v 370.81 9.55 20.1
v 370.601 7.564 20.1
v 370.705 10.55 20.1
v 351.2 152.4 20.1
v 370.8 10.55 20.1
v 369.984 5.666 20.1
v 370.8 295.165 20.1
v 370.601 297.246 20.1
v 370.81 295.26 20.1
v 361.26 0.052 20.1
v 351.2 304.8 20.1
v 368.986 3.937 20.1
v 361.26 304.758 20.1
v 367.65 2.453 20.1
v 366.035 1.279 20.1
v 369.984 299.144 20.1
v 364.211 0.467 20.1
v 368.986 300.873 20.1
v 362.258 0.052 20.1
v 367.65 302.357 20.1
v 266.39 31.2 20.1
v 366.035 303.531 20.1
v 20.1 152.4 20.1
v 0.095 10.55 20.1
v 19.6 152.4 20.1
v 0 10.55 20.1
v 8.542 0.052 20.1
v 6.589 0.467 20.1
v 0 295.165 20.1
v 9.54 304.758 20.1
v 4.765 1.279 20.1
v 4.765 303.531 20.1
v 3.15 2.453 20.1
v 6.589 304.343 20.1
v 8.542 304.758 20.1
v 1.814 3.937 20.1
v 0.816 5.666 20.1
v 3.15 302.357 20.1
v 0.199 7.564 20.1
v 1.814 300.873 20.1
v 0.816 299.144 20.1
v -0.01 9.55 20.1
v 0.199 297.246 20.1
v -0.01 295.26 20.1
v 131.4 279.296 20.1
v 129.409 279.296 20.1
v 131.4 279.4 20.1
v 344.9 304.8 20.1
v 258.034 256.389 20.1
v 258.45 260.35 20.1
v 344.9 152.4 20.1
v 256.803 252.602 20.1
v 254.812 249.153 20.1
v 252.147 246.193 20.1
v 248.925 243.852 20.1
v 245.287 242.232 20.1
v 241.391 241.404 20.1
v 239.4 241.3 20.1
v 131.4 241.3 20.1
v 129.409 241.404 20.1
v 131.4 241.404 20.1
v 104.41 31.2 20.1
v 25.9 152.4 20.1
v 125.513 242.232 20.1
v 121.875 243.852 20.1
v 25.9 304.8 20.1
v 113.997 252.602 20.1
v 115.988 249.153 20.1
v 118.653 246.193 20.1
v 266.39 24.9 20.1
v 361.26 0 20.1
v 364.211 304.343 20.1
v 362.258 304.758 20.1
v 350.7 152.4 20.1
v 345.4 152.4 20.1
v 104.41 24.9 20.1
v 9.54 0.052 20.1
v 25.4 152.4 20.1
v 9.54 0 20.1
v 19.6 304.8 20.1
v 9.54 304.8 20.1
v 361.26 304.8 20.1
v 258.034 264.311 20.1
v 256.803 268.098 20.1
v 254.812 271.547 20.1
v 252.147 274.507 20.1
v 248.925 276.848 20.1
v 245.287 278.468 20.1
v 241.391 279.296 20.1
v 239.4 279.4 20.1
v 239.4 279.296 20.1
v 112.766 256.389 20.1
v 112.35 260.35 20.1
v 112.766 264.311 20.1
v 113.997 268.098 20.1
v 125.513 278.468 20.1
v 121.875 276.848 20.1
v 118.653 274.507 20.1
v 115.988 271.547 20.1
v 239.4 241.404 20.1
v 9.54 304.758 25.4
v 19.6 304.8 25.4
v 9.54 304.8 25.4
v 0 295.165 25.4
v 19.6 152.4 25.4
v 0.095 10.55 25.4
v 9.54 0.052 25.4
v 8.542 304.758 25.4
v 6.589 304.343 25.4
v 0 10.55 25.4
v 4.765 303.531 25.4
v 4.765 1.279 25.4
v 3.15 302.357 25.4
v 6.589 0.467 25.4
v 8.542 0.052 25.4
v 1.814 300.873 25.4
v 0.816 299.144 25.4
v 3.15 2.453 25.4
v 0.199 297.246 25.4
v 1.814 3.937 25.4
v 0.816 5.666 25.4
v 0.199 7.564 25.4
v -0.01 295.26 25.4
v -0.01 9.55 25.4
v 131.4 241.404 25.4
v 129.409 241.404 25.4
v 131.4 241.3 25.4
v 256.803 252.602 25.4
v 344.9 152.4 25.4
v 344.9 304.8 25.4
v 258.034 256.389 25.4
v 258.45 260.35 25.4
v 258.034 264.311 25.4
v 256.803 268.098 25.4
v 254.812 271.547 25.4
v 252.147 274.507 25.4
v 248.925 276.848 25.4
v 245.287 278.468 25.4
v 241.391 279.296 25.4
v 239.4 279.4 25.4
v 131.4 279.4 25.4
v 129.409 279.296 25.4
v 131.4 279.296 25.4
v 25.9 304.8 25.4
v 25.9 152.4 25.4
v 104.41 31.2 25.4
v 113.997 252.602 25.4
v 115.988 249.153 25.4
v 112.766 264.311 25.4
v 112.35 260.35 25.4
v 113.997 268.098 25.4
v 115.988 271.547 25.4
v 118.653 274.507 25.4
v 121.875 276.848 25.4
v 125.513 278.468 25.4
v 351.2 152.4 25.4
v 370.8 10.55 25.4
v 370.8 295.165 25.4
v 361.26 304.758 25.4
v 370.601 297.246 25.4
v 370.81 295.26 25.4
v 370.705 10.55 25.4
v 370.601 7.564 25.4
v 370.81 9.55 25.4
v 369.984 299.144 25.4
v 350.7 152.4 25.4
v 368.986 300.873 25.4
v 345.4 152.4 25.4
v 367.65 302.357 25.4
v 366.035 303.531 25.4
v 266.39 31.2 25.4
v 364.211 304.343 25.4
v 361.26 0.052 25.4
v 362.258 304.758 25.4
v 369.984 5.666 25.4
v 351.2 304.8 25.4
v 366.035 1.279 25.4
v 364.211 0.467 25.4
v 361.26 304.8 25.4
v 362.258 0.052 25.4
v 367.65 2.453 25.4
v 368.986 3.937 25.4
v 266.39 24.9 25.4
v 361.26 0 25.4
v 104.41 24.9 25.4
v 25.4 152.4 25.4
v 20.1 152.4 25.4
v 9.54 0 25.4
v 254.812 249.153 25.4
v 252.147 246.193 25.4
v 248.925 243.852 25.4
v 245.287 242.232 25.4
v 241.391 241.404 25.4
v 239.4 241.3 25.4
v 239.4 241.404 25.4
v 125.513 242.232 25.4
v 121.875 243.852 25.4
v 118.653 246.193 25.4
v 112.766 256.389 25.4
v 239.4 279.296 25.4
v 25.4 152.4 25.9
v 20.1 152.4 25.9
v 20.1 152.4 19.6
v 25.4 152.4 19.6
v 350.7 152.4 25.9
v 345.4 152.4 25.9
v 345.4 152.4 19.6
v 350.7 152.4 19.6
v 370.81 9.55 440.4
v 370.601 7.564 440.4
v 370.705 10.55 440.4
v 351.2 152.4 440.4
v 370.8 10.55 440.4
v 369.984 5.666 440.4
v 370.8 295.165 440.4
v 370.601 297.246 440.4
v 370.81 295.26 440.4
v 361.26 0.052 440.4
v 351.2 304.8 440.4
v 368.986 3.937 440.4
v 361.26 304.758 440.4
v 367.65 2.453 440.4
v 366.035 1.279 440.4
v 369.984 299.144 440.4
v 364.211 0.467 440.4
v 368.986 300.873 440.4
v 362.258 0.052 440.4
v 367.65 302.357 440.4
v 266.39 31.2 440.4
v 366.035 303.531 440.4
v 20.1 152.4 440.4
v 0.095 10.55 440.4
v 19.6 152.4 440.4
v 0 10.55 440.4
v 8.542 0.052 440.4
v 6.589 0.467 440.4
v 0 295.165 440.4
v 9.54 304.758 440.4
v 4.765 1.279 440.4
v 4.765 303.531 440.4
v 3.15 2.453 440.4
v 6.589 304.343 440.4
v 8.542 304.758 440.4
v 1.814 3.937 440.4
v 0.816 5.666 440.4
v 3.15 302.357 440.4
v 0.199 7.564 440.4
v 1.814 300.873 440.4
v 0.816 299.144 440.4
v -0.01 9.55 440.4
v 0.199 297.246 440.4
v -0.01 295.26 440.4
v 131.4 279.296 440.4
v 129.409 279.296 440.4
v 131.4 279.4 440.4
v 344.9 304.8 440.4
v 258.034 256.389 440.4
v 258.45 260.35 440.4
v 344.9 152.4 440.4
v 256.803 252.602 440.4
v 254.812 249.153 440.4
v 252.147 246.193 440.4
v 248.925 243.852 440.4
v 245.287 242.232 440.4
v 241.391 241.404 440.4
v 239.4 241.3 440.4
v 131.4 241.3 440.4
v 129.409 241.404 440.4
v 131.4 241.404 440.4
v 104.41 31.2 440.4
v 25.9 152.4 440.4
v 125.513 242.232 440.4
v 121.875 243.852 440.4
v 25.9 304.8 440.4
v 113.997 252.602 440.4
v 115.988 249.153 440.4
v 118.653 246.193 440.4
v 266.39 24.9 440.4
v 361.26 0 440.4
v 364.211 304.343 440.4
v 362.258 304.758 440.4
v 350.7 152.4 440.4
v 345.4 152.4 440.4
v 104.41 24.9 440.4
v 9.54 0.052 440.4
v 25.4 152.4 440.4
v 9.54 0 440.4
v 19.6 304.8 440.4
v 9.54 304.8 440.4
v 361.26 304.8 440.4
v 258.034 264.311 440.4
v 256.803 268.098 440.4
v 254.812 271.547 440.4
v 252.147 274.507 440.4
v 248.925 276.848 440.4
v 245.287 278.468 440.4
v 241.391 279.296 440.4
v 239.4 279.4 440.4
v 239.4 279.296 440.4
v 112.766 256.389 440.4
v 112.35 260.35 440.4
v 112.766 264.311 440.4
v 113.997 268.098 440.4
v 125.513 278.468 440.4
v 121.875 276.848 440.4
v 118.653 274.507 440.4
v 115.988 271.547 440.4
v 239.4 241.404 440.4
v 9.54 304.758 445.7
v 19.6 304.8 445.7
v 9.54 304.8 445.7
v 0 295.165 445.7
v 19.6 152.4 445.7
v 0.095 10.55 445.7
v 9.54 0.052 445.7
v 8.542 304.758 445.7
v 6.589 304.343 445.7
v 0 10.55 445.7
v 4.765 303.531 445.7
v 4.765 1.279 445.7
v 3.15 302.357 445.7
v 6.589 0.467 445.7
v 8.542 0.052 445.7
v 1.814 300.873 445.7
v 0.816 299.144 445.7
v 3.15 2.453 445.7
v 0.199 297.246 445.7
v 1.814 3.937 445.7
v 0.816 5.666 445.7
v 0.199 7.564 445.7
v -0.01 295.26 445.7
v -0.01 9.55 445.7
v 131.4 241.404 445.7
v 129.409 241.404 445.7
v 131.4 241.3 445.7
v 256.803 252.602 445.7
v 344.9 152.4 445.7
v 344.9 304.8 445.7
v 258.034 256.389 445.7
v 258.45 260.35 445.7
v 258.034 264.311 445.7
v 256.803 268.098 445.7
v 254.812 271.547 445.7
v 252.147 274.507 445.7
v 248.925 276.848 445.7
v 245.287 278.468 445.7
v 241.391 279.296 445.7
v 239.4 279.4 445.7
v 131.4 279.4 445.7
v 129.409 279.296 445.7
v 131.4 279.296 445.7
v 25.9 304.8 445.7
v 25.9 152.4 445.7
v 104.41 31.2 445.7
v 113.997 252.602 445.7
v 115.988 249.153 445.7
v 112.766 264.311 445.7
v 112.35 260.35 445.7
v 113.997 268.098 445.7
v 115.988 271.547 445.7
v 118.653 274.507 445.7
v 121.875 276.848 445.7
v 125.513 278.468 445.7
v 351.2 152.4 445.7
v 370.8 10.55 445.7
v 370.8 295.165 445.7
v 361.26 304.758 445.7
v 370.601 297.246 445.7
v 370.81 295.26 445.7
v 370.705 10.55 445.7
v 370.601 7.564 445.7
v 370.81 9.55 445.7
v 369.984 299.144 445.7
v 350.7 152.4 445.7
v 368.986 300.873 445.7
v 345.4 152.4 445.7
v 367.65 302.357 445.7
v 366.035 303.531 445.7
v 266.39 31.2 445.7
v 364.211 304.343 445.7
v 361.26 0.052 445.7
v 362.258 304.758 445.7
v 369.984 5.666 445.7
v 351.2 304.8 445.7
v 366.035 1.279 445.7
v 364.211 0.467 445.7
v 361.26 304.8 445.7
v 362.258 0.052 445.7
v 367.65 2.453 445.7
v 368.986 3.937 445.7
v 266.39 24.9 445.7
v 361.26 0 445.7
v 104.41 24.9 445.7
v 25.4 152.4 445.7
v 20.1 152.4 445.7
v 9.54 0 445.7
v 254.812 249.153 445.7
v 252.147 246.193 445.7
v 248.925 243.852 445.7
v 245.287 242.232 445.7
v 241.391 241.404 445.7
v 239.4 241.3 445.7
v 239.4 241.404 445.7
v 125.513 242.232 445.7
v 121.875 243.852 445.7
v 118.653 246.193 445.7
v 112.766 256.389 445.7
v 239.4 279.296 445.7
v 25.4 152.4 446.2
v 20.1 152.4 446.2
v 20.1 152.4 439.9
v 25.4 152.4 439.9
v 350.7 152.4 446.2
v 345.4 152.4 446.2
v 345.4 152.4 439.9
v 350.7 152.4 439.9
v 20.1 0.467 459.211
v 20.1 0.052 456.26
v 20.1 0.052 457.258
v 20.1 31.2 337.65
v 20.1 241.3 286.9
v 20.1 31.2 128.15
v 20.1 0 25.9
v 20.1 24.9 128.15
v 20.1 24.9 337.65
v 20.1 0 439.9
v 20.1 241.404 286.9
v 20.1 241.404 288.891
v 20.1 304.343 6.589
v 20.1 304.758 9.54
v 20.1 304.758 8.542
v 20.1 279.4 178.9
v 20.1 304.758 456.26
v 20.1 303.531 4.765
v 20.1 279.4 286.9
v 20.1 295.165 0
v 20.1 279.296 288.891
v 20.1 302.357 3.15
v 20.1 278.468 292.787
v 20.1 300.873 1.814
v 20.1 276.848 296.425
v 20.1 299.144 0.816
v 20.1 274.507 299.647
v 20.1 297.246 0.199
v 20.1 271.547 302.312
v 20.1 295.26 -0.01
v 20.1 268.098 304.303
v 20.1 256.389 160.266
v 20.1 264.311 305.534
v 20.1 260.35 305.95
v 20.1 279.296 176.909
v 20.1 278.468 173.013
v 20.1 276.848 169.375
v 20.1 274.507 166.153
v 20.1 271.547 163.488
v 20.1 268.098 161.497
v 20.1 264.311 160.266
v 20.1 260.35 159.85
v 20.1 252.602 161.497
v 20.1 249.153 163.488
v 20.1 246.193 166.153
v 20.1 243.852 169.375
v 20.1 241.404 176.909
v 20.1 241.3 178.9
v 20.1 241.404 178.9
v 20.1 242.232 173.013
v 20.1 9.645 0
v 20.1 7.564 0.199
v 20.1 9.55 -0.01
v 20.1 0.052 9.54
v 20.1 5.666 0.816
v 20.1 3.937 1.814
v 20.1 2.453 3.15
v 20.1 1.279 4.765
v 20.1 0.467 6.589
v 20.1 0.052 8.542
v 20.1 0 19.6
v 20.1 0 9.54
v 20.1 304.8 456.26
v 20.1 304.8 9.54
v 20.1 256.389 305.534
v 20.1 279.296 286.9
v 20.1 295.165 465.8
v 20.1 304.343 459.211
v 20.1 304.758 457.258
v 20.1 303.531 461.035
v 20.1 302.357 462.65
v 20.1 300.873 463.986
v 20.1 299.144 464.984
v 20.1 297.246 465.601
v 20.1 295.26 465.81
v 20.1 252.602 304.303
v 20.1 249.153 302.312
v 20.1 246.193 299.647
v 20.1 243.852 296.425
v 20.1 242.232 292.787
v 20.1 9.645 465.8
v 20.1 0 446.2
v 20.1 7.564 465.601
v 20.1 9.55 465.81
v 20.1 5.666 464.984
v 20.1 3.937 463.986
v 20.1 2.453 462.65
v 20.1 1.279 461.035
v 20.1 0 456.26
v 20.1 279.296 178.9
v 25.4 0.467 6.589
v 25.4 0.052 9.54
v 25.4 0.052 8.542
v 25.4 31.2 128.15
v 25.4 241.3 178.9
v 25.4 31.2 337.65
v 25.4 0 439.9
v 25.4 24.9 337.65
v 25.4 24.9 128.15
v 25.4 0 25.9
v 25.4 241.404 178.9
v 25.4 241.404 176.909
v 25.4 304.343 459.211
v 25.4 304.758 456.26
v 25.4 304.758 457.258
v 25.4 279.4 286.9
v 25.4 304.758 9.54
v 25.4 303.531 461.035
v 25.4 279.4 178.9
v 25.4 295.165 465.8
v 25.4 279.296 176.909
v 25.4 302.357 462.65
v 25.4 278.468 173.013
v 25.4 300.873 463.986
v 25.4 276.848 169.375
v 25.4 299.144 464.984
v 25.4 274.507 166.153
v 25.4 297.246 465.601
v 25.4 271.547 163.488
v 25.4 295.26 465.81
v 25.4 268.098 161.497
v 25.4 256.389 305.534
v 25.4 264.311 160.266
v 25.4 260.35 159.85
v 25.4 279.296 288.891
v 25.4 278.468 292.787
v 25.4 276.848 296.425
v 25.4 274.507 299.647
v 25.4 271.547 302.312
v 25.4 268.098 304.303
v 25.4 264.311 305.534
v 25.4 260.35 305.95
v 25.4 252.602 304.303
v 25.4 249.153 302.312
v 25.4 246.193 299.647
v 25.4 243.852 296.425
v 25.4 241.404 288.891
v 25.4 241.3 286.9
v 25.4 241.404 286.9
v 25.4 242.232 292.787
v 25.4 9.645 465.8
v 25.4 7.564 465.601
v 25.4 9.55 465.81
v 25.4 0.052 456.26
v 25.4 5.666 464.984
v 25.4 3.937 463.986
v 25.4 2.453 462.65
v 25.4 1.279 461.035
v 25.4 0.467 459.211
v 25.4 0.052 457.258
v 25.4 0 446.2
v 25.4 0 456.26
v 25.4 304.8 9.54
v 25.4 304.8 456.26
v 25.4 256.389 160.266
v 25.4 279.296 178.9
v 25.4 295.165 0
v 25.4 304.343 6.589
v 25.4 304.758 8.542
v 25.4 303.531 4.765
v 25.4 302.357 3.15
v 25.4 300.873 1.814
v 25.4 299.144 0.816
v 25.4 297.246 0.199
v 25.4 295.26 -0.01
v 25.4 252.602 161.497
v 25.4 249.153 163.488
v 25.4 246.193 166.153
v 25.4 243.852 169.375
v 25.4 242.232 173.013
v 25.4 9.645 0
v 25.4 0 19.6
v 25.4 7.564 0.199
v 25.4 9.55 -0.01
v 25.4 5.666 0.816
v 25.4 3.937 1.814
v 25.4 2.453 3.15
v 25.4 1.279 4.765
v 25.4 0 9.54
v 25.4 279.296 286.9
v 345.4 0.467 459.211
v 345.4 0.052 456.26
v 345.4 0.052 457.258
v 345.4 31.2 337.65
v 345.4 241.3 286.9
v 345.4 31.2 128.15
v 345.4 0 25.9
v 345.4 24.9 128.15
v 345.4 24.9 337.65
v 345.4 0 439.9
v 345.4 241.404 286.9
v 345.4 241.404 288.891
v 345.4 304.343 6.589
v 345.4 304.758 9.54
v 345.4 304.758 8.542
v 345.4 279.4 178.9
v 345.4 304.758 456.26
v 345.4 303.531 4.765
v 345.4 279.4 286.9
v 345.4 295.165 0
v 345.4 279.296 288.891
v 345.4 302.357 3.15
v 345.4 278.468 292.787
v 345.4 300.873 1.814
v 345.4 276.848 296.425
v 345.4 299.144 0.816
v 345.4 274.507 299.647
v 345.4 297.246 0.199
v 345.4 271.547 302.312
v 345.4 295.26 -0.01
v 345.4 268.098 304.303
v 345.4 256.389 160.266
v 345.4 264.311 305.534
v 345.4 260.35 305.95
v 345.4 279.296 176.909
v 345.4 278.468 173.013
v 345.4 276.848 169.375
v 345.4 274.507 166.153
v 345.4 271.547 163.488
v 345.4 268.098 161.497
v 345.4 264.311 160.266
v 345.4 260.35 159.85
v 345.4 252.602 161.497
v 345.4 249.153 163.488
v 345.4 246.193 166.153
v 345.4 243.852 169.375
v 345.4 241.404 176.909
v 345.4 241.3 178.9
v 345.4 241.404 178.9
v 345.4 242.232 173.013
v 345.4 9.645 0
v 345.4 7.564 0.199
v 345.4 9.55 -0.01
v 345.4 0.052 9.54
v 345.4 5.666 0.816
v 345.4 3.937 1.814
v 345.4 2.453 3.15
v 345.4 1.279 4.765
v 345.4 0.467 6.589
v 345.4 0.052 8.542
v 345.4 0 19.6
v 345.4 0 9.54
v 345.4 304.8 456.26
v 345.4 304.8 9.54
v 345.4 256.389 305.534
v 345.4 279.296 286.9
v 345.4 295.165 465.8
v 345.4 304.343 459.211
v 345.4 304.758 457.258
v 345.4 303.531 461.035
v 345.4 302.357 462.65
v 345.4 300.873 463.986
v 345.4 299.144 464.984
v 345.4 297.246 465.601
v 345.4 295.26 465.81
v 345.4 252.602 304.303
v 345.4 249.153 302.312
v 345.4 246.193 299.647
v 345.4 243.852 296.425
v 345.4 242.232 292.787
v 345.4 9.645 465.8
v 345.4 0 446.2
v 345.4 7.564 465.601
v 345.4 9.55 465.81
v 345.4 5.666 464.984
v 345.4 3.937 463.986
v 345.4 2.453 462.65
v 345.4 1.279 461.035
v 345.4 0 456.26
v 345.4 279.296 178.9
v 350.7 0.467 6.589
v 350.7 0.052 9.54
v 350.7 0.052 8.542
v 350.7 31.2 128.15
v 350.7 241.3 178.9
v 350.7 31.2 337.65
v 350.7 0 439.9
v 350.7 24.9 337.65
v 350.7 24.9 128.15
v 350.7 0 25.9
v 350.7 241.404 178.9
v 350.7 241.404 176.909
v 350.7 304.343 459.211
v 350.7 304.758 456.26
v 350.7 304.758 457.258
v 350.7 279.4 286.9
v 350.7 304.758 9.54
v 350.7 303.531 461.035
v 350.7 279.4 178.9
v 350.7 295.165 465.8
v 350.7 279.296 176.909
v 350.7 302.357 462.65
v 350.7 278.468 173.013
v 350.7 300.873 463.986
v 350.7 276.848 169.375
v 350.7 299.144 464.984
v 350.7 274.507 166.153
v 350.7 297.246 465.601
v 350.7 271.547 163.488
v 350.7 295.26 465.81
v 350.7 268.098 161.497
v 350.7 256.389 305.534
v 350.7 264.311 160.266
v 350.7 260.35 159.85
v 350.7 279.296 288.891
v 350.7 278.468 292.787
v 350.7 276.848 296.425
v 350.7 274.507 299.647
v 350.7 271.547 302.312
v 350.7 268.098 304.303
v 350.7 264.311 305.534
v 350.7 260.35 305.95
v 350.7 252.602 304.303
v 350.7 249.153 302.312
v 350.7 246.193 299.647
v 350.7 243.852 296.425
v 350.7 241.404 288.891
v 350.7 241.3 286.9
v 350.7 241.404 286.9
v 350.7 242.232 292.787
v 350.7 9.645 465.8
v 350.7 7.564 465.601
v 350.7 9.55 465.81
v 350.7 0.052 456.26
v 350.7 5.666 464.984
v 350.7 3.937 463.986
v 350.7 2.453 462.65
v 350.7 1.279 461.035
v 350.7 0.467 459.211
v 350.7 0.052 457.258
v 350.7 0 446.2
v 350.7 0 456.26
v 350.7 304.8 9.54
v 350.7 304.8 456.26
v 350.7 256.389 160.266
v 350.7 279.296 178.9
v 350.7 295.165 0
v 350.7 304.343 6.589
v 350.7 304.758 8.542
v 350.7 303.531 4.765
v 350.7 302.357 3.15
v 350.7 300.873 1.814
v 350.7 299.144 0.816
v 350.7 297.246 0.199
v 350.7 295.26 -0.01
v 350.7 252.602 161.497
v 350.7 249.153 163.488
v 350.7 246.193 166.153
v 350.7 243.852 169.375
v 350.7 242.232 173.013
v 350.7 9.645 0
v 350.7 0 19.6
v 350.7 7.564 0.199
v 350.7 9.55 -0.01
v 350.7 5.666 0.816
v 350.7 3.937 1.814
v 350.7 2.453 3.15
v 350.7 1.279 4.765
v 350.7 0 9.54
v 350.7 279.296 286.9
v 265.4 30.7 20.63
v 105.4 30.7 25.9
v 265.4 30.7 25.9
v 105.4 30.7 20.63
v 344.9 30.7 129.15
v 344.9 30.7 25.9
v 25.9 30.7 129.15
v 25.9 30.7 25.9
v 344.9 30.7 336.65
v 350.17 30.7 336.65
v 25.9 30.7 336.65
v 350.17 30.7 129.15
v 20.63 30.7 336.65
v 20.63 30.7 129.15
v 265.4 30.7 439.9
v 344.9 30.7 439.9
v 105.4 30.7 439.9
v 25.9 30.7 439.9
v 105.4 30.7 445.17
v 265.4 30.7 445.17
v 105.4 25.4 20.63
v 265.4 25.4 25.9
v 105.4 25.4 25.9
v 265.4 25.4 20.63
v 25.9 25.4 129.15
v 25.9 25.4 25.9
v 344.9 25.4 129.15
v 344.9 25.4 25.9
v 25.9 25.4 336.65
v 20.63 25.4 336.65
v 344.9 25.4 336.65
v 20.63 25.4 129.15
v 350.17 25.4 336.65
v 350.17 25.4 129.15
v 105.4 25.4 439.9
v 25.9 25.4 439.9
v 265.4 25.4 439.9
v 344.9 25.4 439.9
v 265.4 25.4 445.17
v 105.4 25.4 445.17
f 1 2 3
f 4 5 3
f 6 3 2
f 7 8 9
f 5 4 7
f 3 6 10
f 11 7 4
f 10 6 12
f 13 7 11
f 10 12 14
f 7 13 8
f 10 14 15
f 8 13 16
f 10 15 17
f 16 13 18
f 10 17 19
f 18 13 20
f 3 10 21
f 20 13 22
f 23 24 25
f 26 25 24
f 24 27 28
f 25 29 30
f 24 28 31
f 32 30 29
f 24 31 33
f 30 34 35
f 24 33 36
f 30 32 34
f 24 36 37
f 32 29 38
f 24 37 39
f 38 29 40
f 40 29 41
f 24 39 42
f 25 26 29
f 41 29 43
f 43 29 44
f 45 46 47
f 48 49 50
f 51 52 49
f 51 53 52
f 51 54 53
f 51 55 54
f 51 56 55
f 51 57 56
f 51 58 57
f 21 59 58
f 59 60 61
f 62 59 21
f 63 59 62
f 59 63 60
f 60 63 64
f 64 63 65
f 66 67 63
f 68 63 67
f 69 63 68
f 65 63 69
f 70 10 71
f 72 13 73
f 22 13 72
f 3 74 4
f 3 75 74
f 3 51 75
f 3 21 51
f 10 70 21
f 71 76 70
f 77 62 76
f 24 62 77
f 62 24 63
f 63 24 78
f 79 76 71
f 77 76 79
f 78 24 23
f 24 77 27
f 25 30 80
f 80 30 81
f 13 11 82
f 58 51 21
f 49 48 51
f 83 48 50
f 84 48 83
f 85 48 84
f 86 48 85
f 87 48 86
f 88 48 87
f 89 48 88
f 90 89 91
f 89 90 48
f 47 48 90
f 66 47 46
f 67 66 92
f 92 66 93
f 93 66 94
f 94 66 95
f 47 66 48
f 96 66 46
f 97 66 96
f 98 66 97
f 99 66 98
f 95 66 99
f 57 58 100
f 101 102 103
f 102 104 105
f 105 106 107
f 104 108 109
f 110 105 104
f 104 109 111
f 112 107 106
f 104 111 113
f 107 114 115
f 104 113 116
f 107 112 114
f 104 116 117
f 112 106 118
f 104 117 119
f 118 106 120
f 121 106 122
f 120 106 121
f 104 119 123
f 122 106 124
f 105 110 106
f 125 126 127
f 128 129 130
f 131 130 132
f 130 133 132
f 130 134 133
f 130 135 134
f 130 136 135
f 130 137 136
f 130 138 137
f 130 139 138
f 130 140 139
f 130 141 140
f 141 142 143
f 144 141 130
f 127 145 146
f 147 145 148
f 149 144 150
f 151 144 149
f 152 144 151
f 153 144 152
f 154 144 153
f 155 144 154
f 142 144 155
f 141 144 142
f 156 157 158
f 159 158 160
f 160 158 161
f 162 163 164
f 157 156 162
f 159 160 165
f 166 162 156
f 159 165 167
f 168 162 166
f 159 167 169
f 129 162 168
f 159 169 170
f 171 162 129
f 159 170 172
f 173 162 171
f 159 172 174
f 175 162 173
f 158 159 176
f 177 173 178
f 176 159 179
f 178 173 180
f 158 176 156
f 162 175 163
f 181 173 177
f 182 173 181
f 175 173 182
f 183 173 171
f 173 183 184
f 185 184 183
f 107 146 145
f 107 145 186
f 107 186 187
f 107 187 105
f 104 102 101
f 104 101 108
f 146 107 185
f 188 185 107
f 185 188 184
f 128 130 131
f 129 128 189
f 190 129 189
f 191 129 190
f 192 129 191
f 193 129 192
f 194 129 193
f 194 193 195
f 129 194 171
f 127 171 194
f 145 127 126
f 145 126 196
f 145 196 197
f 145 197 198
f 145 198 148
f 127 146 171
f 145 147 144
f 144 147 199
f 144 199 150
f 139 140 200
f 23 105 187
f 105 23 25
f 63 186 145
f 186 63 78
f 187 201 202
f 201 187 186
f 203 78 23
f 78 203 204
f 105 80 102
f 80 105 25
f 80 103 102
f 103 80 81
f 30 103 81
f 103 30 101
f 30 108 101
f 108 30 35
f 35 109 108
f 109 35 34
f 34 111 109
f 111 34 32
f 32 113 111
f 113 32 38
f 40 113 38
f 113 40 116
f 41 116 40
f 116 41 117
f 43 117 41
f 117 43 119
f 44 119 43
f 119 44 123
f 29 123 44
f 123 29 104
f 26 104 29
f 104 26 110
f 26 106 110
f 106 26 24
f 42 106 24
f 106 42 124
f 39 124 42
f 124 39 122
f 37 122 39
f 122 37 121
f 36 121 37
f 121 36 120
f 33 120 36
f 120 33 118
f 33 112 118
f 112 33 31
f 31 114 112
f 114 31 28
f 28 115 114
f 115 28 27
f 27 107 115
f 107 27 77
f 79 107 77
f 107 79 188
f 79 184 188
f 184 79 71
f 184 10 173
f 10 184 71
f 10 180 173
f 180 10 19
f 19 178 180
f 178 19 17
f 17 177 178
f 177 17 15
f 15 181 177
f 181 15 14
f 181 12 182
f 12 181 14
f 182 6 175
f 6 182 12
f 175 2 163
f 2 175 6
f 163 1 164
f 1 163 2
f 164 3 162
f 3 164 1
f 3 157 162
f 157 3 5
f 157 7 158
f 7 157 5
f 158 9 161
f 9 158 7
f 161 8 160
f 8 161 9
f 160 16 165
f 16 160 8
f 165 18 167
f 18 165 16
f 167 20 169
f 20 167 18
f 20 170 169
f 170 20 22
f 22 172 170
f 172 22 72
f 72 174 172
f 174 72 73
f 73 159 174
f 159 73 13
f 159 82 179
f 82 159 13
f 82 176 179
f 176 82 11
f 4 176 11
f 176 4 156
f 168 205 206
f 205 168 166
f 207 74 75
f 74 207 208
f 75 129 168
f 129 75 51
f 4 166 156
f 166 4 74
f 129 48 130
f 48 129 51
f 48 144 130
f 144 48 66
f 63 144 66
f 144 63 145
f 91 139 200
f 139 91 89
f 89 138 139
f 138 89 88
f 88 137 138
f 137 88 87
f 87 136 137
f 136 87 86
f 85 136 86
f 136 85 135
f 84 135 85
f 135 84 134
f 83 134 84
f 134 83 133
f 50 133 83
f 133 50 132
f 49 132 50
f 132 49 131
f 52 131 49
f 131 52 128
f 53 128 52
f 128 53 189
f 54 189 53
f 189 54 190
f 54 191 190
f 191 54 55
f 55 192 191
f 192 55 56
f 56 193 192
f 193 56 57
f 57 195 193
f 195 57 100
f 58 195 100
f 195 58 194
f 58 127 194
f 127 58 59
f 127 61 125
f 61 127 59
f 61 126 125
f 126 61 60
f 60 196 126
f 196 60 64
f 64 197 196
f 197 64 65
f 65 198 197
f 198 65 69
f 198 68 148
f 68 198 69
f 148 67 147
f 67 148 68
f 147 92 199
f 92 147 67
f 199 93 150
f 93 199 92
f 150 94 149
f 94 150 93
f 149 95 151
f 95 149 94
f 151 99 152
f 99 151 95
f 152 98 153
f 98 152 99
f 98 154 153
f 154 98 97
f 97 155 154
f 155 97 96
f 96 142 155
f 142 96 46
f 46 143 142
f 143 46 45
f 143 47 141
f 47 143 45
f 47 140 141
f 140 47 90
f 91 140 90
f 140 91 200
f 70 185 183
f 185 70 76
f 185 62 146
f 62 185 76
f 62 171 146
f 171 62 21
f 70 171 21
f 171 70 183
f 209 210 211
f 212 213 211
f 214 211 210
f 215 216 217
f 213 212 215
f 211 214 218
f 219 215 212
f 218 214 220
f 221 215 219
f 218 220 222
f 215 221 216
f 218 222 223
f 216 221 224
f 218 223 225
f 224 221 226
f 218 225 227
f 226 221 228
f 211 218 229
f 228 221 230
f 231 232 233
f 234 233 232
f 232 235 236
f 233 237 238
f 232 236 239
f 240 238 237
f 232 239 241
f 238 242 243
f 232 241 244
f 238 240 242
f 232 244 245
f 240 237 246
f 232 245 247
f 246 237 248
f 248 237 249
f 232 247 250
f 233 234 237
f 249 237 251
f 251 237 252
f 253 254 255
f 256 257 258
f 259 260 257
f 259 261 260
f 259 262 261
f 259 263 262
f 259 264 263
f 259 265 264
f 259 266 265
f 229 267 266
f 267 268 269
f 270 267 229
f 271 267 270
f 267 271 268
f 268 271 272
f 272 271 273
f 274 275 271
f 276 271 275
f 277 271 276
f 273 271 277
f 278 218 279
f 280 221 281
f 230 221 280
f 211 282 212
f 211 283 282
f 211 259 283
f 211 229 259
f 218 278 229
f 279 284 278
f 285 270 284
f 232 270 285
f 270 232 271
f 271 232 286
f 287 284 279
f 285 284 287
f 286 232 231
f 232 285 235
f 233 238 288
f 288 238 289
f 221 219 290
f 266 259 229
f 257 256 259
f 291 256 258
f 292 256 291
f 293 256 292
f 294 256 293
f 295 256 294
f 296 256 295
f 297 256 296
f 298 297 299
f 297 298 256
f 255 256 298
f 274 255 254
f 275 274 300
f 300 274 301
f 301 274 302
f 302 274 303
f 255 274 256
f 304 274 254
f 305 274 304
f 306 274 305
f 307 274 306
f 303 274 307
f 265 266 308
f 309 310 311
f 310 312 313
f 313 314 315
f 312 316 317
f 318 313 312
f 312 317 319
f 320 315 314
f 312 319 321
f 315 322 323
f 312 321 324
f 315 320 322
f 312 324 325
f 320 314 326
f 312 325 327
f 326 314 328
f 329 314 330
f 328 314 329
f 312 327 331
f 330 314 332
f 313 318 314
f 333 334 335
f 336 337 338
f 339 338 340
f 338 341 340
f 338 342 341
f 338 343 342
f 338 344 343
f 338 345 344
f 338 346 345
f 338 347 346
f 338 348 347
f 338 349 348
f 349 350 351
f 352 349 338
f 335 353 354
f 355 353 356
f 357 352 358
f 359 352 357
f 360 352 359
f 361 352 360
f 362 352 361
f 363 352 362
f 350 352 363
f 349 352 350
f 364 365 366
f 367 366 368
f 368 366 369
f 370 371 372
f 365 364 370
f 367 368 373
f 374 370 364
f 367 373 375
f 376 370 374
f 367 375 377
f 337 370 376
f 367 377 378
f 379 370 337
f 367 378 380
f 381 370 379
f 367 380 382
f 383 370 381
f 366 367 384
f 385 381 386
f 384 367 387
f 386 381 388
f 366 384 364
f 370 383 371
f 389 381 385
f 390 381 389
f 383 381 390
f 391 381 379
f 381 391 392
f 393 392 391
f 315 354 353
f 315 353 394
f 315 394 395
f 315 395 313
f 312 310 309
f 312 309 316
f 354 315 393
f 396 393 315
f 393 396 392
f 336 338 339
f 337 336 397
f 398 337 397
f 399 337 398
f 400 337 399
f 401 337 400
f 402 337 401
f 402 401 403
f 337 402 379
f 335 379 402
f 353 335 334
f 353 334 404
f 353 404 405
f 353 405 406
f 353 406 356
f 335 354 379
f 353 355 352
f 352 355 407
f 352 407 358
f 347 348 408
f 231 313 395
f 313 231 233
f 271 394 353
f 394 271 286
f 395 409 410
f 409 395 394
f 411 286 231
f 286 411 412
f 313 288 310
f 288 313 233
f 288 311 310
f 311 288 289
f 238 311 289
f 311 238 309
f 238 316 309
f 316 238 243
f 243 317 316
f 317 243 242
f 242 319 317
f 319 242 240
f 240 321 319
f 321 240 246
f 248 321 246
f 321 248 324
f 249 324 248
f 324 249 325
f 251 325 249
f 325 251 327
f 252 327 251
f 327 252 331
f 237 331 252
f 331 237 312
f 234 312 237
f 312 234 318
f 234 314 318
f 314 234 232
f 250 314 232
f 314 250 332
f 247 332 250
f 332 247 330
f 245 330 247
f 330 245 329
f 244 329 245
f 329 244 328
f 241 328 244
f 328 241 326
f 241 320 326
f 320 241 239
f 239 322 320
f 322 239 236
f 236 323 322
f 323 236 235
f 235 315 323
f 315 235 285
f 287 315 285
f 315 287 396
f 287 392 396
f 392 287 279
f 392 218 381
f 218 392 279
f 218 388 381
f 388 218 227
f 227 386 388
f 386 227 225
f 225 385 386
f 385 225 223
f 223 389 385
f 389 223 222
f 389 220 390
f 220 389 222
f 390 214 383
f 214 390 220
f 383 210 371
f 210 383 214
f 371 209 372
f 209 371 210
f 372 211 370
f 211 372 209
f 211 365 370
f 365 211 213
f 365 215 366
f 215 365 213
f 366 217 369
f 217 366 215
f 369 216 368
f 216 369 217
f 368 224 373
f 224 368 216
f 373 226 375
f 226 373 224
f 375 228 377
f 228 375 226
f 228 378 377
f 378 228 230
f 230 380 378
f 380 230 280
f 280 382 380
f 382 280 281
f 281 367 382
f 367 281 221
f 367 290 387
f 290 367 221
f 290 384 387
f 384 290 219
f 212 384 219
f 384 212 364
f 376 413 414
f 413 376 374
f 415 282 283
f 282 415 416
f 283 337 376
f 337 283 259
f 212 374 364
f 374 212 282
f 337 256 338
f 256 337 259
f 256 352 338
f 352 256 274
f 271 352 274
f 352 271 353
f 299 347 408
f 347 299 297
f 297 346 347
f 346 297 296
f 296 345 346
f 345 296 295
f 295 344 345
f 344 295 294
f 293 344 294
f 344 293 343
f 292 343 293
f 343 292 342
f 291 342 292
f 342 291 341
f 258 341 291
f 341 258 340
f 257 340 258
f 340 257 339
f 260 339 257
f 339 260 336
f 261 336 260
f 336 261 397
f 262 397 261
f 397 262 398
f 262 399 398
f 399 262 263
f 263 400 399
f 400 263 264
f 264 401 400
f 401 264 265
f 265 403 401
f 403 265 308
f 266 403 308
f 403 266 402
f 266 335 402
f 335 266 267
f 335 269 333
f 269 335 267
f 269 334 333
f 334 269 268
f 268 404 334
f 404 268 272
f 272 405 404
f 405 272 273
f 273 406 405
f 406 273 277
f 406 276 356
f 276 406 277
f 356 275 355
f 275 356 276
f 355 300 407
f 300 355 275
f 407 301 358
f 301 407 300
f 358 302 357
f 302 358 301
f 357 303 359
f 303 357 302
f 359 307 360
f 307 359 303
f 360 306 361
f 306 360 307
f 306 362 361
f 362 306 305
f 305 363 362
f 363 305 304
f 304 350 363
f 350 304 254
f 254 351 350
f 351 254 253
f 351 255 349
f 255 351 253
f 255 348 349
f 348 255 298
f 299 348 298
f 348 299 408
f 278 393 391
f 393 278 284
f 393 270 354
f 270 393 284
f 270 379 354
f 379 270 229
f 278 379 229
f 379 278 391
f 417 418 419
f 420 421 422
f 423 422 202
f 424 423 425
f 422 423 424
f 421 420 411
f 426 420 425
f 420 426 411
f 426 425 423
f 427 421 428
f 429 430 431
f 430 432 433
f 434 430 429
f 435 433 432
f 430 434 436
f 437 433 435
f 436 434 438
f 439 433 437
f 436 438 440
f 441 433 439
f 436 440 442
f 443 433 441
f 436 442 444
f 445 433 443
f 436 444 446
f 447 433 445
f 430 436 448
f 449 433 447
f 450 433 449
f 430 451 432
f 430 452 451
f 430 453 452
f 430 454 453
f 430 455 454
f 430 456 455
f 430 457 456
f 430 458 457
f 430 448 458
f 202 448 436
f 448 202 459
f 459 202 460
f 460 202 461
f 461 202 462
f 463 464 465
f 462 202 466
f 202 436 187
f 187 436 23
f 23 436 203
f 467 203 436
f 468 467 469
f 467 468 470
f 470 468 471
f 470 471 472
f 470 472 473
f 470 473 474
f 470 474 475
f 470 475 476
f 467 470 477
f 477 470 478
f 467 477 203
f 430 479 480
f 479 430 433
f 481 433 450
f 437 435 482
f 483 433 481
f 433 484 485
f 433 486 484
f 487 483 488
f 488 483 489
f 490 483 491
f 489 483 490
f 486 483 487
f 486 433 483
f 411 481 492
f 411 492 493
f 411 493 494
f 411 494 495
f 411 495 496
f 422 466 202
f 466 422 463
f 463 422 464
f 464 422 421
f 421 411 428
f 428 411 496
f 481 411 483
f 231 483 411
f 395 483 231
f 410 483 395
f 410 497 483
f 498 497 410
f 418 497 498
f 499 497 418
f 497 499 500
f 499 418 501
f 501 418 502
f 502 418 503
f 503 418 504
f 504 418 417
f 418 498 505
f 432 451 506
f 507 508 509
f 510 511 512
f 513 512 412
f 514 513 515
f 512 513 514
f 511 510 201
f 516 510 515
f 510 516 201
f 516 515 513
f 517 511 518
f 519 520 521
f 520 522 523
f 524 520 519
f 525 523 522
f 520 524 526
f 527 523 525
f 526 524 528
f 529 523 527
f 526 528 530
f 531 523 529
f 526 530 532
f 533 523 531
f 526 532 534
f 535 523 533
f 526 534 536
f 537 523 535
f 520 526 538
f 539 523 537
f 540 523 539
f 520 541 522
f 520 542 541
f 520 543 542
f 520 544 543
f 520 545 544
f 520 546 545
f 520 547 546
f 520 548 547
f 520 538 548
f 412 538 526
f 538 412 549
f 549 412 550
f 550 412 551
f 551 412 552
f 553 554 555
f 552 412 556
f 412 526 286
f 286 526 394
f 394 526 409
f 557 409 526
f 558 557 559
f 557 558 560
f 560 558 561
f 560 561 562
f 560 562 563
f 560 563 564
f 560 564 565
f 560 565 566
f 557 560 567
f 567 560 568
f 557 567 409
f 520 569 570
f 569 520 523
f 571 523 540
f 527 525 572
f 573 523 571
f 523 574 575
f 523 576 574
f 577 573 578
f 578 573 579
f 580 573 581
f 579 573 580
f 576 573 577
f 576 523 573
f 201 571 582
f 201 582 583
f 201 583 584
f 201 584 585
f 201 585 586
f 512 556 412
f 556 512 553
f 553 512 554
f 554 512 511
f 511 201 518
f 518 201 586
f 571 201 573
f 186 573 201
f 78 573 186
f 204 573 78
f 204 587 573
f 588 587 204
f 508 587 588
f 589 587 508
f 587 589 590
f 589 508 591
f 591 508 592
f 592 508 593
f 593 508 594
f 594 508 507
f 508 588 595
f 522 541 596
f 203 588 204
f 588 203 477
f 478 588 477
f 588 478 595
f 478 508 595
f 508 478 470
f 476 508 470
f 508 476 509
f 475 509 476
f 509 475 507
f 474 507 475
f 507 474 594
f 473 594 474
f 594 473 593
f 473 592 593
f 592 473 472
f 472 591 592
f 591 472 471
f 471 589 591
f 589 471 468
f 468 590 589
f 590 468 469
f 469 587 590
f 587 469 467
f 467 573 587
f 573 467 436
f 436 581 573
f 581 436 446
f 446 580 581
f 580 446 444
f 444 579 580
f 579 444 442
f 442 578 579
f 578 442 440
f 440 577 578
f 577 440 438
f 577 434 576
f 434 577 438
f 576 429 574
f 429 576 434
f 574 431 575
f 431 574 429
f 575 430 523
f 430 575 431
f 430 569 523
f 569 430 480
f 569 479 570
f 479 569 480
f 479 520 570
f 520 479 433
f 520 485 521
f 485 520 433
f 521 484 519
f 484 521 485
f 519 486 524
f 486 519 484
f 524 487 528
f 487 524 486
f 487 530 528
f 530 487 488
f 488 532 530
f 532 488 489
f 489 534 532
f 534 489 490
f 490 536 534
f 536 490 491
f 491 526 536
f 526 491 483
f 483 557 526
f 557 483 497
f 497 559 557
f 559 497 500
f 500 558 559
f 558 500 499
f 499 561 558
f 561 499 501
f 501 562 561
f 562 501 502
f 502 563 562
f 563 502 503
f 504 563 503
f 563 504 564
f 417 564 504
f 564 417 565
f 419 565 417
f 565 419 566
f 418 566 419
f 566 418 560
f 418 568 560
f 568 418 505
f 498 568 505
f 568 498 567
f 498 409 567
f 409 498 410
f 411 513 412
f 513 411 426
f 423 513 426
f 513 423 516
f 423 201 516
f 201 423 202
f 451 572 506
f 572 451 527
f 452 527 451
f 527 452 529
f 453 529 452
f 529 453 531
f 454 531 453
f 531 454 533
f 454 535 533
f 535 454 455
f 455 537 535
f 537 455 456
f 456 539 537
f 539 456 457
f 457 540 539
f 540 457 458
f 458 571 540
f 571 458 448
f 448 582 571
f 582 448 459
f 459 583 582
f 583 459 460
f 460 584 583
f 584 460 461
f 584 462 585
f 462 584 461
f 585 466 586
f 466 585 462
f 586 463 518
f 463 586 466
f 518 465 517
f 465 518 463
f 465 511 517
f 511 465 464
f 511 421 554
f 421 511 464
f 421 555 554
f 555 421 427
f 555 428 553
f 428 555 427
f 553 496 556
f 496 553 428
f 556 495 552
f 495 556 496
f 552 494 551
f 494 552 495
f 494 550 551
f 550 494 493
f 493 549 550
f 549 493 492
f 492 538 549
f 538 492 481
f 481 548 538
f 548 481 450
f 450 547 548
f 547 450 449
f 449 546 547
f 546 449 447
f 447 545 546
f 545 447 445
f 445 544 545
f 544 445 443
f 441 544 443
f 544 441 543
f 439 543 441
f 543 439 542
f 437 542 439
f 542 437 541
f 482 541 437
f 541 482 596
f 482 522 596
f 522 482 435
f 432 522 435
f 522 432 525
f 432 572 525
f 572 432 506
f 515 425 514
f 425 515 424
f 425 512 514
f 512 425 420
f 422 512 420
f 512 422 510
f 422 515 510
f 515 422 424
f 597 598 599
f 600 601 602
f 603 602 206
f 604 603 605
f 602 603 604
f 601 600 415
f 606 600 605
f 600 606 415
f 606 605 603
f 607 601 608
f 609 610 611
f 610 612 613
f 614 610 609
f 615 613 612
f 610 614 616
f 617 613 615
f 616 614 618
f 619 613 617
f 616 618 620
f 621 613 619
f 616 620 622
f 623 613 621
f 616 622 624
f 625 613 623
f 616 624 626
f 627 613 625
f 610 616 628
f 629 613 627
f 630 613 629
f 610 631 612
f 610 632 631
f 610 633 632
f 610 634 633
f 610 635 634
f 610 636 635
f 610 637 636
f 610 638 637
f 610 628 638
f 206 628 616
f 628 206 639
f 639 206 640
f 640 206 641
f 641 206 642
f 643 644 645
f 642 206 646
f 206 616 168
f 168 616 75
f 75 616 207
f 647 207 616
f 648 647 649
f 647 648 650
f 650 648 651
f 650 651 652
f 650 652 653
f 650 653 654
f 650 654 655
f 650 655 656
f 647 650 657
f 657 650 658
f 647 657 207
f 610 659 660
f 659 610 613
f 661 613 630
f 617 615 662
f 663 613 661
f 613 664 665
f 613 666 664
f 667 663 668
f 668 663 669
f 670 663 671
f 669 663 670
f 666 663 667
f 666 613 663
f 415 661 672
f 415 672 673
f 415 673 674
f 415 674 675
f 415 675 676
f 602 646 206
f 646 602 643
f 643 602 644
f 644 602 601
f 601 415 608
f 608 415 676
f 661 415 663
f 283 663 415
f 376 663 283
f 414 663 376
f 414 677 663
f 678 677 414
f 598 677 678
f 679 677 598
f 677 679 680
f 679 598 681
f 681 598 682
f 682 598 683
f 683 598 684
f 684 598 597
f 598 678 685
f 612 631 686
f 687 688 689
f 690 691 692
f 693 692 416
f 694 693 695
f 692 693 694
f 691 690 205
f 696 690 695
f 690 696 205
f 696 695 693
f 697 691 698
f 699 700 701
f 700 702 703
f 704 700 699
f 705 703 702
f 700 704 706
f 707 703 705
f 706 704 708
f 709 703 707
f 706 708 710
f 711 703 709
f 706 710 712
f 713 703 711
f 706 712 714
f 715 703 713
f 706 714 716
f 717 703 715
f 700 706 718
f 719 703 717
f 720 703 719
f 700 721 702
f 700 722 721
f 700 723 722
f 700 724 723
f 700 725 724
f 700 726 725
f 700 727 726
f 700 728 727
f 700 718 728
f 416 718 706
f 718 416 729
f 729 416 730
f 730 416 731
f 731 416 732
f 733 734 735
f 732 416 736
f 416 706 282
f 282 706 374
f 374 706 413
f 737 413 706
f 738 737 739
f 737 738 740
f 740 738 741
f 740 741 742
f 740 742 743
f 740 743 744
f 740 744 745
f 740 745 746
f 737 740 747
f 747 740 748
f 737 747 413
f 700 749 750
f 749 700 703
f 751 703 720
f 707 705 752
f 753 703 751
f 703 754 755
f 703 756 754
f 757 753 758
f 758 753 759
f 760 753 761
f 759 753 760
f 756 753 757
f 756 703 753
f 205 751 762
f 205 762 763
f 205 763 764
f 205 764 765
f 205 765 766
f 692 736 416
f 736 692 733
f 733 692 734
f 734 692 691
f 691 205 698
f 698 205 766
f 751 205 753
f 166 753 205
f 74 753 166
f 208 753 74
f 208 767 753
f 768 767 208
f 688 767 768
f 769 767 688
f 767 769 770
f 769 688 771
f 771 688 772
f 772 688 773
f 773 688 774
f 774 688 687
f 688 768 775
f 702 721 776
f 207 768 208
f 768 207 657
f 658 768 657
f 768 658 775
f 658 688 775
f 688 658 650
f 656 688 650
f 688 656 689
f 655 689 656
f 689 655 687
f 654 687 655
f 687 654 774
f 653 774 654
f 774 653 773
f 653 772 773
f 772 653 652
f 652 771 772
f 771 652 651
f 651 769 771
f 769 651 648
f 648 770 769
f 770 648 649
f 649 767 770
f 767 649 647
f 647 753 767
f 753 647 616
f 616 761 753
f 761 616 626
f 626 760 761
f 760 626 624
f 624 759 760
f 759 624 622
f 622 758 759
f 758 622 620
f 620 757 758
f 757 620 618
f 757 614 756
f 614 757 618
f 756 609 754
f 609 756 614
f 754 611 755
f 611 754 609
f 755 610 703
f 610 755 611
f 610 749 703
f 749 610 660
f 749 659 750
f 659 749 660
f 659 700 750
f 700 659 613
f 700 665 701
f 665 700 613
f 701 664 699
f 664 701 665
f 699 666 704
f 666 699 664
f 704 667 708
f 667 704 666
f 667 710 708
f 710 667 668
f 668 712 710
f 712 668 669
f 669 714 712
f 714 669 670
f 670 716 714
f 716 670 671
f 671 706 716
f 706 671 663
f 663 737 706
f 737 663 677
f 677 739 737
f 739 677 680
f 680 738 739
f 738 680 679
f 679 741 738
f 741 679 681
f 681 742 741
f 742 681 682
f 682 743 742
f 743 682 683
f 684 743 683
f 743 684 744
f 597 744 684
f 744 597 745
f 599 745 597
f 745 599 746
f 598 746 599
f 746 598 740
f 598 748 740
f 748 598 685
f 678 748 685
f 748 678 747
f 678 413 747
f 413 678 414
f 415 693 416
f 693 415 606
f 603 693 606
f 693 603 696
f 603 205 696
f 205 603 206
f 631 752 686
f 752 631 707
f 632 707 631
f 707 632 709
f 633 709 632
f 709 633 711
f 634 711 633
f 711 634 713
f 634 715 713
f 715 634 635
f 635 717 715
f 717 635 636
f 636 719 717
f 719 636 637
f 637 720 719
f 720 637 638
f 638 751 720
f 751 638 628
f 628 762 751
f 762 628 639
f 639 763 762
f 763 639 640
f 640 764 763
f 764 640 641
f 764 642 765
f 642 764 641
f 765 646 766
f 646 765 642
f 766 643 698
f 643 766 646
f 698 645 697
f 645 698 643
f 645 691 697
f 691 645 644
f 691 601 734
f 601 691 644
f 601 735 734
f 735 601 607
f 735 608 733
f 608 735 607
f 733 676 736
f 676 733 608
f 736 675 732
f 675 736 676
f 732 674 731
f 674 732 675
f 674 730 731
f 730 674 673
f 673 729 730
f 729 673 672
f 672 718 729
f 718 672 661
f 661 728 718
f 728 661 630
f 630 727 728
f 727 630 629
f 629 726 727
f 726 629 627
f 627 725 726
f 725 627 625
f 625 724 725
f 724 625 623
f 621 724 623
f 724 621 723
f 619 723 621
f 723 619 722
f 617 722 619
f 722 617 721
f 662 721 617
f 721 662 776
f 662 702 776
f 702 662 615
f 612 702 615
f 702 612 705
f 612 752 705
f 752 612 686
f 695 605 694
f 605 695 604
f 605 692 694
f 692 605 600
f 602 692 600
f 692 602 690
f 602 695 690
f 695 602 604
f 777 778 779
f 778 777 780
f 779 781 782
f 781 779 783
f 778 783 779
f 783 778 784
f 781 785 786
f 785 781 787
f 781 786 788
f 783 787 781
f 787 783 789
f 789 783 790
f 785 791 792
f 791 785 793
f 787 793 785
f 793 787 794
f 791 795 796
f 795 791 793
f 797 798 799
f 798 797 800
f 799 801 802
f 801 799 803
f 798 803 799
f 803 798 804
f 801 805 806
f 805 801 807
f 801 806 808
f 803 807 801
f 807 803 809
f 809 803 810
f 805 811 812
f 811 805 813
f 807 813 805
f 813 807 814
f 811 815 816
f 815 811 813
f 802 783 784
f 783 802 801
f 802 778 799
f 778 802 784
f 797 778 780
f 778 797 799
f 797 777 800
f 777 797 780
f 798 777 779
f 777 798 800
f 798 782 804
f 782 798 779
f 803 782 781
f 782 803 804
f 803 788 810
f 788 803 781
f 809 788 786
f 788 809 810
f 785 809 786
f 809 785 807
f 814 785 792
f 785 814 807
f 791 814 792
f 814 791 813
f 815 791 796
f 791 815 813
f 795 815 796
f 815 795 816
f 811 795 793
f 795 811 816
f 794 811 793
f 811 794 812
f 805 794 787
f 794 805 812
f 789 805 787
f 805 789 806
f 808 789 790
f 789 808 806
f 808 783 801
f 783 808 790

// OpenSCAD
// Global

plywoodThickness=5.3;

overhang=25.4; 
handleDepth=25.4;
handleX=108; // Including the radiused ends.
handleY=38.1;

// Side A, the WIDE side.

width=320; // Internal measurement. Currently set to UHual small box internal sizes
widthE=width+overhang*2; // External width
height = 304.8;
tabWidth=width/2;

fudge=1; // Fudge factor for slots (added to the slots.)

// Side B, the LONG side. 

length=415; // Internal measurement Currently set to UHual small box internal sizes
lengthE = length + overhang*2; // External measurment
tabLength=length/2;

// Bottom of box

undercut = .9; // Percent of plywood thickness that tabs are inset after assembly. Nomadic Furniture places it at 1/2--3/4 plywood thickness.


// Begin CAD


// A side, the WIDE side of the box.


module aHalf(){
   
    
difference(){
square([widthE/2, height]);

// Cutting out rectangular part of handle

translate([0, height -handleDepth- handleY, 0]){
square([handleX/2, handleY]);
}

// Radius for end of handle

translate([handleX/2, height-handleDepth-handleY/2, 0]){
circle(handleY/2);
}

// Vertical slots

translate([widthE/2 - overhang-fudge/2, height/2, 0]){

square([plywoodThickness+fudge, height/2+0.01]);
}

// Tab slot

translate([-0.01, overhang-fudge/2, 0]){
square([tabWidth/2+fudge, plywoodThickness+fudge]);
}

} // End difference block

}  // End define module half


module aHalfRound(){
    
    difference(){
    aHalf();
        translate([width/2+plywoodThickness+fudge + (overhang-plywoodThickness-fudge)/2+.01 ,height-(overhang-plywoodThickness-fudge)+(overhang-plywoodThickness-fudge)/2+.01,0])
    square((overhang-plywoodThickness-fudge)/2);
        
      translate([width/2+plywoodThickness+fudge + (overhang-plywoodThickness-fudge)/2+.01 ,0 ,0])
    square((overhang-plywoodThickness-fudge)/2+1); 
    }
    
    translate([width/2+plywoodThickness+fudge + (overhang-plywoodThickness-fudge)/2+.01 ,height-(overhang-plywoodThickness-fudge)+(overhang-plywoodThickness-fudge)/2+.01,0])
    circle(d=(overhang-plywoodThickness-fudge));
    
    translate([width/2+plywoodThickness+fudge + (overhang-plywoodThickness-fudge)/2+.01 ,(overhang-plywoodThickness-fudge)/2 ,0])
    circle(d=(overhang-plywoodThickness-fudge));
}






module A1(){



aHalfRound(); // If you want sqare edges, change this the indentical module bellow to "half();"

 mirror([1, 0, 0]){
  aHalfRound();
}
} // End define module A1



// 0-ing bottom left corner
module A(){

translate([widthE/2, 0, 0]){
    A1();
}
}


// B side, the LONG side of the box.

module bHalf(){
   
difference(){
square([lengthE/2, height]);

// Cutting out rectangular part of handle
translate([0, height -handleDepth- handleY, 0]){
square([handleX/2, handleY]);
}

// Radius for end of handle

translate([handleX/2, height-handleDepth-handleY/2, 0]){
circle(handleY/2);
}

// Vertical Slots

translate([lengthE/2 - overhang-fudge/2, 0, 0]){

square([plywoodThickness+fudge, height/2]);
}

// Tab slot

translate([0, overhang-fudge/2, 0]){
square([tabLength/2+fudge, plywoodThickness+fudge]);
    // See line 41
}

} // End difference block
} // End defining module half

module bHalfRound(){
    
    difference(){
    bHalf();
        translate([length/2+plywoodThickness+fudge + (overhang-plywoodThickness-fudge)/2+.01 ,height-(overhang-plywoodThickness-fudge)+(overhang-plywoodThickness-fudge)/2+.01,0])
    square((overhang-plywoodThickness-fudge)/2);
        
      translate([length/2+plywoodThickness+fudge + (overhang-plywoodThickness-fudge)/2+.01 ,0 ,0])
    square((overhang-plywoodThickness-fudge)/2); 
    }
    
    translate([length/2+plywoodThickness+fudge + (overhang-plywoodThickness-fudge)/2+.01 ,height-(overhang-plywoodThickness-fudge)+(overhang-plywoodThickness-fudge)/2+.01,0])
    circle(d=(overhang-plywoodThickness-fudge));
    
    translate([length/2+plywoodThickness+fudge + (overhang-plywoodThickness-fudge)/2+.01 ,(overhang-plywoodThickness-fudge)/2 ,0])
    circle(d=(overhang-plywoodThickness-fudge));
}


module B1() {


bHalfRound(); // If you want sqare edges, change this the indentical module bellow to "half();"

 mirror([1, 0, 0]){
  bHalfRound();
}
} // End defining module B1



// 0-ing bottom left corner

module B(){
translate([lengthE/2, 0, 0]){
B1();
}
}


// The bottom of the box

module quarter(){
square([width/2-fudge/2, length/2-fudge/2]);
// Side tab
translate([width/2-fudge, 0, 0]){
square([plywoodThickness*undercut+fudge, tabLength/2]);
}
// Top tab
translate([0, length/2-fudge, 0]){
square([tabWidth/2, plywoodThickness*undercut+fudge]);
}
}


module cHalf(){
quarter();
mirror([1, 0, 0]){
    quarter();
    }
}

module C(){
translate([width/2+plywoodThickness*undercut, length/2+plywoodThickness*undercut]){

cHalf();

mirror([0, 1, 0]){
cHalf();
}
}
}

// 3D model

module box(){

// A sides

translate([0,0,overhang-plywoodThickness])
linear_extrude(plywoodThickness)
A();

translate([0,0,length+overhang])
linear_extrude(plywoodThickness)
A();

// B sides

translate([overhang-plywoodThickness,0,length+overhang*2])
rotate([0,90,0])
linear_extrude(plywoodThickness)
B();

translate([overhang + width ,0,length+overhang*2])
rotate([0,90,0])
linear_extrude(plywoodThickness)
B();

// C sides

rotate([90,0,0])
translate([overhang-plywoodThickness*undercut,overhang-plywoodThickness*undercut,-overhang-plywoodThickness])
linear_extrude(plywoodThickness)
C();
}

// 3D Rendering

box();

// 2D rednerings

//A();
//B();
//C();
